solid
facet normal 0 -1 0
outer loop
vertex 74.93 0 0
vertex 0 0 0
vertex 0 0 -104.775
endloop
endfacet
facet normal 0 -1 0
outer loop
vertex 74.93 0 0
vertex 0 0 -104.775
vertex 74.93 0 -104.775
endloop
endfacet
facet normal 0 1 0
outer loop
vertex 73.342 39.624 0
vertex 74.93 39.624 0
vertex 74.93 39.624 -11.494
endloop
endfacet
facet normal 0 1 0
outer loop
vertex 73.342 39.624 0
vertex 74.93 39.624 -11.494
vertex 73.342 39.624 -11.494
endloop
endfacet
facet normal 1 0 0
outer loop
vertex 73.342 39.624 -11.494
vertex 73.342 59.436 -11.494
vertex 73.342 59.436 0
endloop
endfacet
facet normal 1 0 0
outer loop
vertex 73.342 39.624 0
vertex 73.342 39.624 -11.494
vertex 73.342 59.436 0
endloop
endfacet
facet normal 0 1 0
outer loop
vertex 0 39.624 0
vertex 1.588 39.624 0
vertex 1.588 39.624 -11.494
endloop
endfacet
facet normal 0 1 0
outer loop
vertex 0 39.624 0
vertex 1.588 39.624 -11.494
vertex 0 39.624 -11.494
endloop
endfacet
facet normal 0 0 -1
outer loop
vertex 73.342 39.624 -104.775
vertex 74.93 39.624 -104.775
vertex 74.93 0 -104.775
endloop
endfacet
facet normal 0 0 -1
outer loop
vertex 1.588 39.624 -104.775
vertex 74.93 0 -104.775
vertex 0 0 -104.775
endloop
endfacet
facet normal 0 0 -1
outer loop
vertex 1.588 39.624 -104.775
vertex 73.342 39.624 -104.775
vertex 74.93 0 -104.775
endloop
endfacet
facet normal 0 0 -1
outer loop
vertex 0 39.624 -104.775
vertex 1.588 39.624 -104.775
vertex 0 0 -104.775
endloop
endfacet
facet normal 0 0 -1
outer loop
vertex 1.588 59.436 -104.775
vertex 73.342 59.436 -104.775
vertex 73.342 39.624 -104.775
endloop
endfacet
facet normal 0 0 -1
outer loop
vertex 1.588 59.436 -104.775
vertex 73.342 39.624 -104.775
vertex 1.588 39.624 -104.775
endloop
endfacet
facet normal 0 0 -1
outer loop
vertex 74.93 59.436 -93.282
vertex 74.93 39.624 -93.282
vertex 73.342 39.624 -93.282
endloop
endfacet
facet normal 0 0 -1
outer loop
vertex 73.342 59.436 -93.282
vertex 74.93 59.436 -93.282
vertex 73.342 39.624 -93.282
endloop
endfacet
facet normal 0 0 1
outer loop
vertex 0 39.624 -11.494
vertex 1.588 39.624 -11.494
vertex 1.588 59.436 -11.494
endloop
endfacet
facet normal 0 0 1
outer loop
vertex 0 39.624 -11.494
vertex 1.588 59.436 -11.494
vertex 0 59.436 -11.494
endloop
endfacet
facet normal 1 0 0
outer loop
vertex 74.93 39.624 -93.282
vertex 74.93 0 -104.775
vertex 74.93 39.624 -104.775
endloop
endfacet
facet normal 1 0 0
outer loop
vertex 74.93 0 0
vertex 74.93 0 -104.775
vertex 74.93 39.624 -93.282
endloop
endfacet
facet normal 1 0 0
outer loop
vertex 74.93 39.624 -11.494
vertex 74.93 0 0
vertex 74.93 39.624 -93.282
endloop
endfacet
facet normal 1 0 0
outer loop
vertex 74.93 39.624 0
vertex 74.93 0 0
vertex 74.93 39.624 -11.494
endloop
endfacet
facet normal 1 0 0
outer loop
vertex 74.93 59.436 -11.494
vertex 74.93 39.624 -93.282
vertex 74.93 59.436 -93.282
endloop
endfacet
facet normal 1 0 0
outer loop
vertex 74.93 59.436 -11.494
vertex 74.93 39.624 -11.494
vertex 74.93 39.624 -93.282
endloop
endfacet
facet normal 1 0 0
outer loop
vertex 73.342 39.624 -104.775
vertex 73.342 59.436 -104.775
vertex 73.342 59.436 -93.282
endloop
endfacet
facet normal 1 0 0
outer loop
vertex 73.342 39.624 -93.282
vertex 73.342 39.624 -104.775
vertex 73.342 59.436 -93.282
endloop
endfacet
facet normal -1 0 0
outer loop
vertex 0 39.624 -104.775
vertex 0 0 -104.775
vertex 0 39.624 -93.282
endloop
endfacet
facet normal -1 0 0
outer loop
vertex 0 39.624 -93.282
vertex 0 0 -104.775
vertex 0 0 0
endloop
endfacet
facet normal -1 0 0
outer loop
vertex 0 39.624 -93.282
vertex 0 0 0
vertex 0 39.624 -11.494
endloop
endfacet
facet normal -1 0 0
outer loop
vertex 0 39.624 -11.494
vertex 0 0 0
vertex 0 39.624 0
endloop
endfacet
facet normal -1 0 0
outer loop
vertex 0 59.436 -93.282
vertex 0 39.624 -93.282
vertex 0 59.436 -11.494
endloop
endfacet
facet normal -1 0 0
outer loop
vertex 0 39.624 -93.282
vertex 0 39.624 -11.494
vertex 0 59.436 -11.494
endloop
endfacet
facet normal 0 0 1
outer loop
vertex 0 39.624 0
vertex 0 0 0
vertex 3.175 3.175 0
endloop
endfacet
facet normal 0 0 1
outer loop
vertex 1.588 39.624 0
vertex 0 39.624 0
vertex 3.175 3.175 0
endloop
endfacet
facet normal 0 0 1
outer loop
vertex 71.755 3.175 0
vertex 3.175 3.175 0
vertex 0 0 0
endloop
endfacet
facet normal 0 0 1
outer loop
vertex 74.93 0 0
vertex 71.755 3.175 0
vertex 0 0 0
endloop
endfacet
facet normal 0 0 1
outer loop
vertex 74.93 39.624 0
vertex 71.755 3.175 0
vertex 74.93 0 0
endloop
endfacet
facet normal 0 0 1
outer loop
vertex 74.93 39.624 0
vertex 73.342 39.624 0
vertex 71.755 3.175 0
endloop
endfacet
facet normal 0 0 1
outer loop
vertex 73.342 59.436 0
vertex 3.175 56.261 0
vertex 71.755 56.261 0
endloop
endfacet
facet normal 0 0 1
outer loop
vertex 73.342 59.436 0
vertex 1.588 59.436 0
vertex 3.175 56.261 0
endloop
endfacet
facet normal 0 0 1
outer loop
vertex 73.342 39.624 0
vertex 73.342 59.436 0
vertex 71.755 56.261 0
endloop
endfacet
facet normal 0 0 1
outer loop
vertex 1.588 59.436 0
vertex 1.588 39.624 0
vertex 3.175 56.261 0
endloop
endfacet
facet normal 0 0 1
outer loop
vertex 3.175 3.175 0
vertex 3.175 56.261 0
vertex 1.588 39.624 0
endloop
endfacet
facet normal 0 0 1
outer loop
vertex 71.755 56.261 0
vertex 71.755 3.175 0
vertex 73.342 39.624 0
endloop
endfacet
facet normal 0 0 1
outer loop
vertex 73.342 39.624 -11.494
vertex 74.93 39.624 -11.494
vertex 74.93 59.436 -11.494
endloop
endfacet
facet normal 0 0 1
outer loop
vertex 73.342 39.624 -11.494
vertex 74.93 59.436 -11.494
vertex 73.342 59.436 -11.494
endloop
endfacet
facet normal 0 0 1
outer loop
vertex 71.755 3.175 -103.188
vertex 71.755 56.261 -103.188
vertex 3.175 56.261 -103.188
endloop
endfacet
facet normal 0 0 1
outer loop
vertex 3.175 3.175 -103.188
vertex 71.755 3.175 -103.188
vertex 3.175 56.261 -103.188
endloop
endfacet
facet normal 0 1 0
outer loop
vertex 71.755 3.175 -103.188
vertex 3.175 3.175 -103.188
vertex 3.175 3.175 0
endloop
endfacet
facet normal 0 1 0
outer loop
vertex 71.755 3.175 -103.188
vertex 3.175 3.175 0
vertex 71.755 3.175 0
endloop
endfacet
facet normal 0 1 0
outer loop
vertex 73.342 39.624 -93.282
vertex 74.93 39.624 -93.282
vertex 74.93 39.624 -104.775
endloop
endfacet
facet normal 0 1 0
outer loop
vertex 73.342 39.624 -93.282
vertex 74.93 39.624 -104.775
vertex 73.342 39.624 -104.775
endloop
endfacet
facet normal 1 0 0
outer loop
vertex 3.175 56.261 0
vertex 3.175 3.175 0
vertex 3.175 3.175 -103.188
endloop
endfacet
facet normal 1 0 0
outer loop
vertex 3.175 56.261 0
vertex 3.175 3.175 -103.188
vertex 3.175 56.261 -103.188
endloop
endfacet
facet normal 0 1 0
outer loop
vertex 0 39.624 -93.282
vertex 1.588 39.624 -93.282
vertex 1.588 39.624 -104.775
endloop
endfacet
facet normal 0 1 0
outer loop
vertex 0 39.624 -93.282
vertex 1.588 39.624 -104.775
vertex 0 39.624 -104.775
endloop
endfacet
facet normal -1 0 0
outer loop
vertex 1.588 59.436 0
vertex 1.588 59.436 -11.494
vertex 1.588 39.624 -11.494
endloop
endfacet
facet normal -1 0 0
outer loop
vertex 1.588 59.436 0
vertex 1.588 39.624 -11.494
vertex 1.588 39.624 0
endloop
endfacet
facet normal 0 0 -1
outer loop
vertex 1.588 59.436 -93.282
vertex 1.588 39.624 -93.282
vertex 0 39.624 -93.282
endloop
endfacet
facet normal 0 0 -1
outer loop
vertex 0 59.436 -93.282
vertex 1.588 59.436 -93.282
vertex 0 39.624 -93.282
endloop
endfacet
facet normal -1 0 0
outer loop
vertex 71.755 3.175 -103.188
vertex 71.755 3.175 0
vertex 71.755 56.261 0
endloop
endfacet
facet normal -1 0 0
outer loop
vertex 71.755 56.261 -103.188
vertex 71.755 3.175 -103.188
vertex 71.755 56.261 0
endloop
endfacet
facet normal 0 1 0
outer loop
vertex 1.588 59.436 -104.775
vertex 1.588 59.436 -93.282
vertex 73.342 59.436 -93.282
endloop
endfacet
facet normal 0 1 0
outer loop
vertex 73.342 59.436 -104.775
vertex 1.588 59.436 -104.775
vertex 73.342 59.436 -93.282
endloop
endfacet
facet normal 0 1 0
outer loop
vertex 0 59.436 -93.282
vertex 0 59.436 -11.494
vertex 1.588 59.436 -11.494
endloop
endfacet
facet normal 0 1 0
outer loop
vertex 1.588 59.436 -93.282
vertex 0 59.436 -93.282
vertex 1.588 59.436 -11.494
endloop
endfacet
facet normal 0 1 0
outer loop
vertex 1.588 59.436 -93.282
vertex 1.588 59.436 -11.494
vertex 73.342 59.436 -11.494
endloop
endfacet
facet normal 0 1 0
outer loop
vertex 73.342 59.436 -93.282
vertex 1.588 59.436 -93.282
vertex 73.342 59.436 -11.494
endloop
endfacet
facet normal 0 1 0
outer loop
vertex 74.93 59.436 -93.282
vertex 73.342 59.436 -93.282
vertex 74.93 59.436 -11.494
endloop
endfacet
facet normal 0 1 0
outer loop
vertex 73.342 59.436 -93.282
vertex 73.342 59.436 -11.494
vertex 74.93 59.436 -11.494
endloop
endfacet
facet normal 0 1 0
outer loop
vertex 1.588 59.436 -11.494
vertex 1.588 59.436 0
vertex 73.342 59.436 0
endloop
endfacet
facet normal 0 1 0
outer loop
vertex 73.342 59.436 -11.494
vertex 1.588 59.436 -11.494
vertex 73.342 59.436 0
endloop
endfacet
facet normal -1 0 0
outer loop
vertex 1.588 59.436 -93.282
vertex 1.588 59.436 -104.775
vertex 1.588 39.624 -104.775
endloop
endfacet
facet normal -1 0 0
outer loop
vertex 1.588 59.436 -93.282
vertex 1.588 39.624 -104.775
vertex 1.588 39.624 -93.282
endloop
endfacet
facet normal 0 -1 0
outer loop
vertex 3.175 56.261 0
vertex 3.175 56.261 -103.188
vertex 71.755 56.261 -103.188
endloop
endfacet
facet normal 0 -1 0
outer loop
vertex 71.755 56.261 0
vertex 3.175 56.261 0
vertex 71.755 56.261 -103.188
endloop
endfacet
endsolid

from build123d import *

# Parameters (mm, degrees)
SKETCH2_W      = 74.93
SKETCH2_H      = 59.436
SKETCH2_W_2    = 68.58
SKETCH2_H_2    = 53.086
EXTRUDE1_DEPTH = 104.775
SKETCH4_W      = 1.5875
SKETCH4_H      = 11.4935
EXTRUDE2_DEPTH = 19.812
SKETCH13_W     = 68.58
SKETCH13_H     = 53.086
EXTRUDE4_DEPTH = 1.5875


with BuildPart() as part:
    # Sketch2 → Extrude1 (new body)
    with BuildSketch(Plane.XY):
        with Locations((37.465, 29.718)):
            Rectangle(SKETCH2_W, SKETCH2_H)
        with Locations((37.465, 29.718)):
            Rectangle(SKETCH2_W_2, SKETCH2_H_2, mode=Mode.SUBTRACT)
    extrude(amount=-EXTRUDE1_DEPTH)

    # Sketch4 → Extrude2 (cut)
    with BuildSketch(Plane(origin=(0, 59.436, 0), x_dir=(-1, 0, 0), z_dir=(0, 1, 0))):
        with Locations((-0.79375, -99.02825)):
            Rectangle(SKETCH4_W, SKETCH4_H)
        with Locations((-0.79375, -5.74675)):
            Rectangle(SKETCH4_W, SKETCH4_H)
        with Locations((-74.13625, -5.74675)):
            Rectangle(SKETCH4_W, SKETCH4_H)
        with Locations((-74.13625, -99.02825)):
            Rectangle(SKETCH4_W, SKETCH4_H)
    extrude(amount=-EXTRUDE2_DEPTH, mode=Mode.SUBTRACT)

    # Sketch13 → Extrude4 (add)
    with BuildSketch(Plane(origin=(0, 0, -104.775), x_dir=(-1, 0, 0), z_dir=(0, 0, -1))):
        with Locations((-37.465, 29.718)):
            Rectangle(SKETCH13_W, SKETCH13_H)
    extrude(amount=-EXTRUDE4_DEPTH)


solid = part.part
